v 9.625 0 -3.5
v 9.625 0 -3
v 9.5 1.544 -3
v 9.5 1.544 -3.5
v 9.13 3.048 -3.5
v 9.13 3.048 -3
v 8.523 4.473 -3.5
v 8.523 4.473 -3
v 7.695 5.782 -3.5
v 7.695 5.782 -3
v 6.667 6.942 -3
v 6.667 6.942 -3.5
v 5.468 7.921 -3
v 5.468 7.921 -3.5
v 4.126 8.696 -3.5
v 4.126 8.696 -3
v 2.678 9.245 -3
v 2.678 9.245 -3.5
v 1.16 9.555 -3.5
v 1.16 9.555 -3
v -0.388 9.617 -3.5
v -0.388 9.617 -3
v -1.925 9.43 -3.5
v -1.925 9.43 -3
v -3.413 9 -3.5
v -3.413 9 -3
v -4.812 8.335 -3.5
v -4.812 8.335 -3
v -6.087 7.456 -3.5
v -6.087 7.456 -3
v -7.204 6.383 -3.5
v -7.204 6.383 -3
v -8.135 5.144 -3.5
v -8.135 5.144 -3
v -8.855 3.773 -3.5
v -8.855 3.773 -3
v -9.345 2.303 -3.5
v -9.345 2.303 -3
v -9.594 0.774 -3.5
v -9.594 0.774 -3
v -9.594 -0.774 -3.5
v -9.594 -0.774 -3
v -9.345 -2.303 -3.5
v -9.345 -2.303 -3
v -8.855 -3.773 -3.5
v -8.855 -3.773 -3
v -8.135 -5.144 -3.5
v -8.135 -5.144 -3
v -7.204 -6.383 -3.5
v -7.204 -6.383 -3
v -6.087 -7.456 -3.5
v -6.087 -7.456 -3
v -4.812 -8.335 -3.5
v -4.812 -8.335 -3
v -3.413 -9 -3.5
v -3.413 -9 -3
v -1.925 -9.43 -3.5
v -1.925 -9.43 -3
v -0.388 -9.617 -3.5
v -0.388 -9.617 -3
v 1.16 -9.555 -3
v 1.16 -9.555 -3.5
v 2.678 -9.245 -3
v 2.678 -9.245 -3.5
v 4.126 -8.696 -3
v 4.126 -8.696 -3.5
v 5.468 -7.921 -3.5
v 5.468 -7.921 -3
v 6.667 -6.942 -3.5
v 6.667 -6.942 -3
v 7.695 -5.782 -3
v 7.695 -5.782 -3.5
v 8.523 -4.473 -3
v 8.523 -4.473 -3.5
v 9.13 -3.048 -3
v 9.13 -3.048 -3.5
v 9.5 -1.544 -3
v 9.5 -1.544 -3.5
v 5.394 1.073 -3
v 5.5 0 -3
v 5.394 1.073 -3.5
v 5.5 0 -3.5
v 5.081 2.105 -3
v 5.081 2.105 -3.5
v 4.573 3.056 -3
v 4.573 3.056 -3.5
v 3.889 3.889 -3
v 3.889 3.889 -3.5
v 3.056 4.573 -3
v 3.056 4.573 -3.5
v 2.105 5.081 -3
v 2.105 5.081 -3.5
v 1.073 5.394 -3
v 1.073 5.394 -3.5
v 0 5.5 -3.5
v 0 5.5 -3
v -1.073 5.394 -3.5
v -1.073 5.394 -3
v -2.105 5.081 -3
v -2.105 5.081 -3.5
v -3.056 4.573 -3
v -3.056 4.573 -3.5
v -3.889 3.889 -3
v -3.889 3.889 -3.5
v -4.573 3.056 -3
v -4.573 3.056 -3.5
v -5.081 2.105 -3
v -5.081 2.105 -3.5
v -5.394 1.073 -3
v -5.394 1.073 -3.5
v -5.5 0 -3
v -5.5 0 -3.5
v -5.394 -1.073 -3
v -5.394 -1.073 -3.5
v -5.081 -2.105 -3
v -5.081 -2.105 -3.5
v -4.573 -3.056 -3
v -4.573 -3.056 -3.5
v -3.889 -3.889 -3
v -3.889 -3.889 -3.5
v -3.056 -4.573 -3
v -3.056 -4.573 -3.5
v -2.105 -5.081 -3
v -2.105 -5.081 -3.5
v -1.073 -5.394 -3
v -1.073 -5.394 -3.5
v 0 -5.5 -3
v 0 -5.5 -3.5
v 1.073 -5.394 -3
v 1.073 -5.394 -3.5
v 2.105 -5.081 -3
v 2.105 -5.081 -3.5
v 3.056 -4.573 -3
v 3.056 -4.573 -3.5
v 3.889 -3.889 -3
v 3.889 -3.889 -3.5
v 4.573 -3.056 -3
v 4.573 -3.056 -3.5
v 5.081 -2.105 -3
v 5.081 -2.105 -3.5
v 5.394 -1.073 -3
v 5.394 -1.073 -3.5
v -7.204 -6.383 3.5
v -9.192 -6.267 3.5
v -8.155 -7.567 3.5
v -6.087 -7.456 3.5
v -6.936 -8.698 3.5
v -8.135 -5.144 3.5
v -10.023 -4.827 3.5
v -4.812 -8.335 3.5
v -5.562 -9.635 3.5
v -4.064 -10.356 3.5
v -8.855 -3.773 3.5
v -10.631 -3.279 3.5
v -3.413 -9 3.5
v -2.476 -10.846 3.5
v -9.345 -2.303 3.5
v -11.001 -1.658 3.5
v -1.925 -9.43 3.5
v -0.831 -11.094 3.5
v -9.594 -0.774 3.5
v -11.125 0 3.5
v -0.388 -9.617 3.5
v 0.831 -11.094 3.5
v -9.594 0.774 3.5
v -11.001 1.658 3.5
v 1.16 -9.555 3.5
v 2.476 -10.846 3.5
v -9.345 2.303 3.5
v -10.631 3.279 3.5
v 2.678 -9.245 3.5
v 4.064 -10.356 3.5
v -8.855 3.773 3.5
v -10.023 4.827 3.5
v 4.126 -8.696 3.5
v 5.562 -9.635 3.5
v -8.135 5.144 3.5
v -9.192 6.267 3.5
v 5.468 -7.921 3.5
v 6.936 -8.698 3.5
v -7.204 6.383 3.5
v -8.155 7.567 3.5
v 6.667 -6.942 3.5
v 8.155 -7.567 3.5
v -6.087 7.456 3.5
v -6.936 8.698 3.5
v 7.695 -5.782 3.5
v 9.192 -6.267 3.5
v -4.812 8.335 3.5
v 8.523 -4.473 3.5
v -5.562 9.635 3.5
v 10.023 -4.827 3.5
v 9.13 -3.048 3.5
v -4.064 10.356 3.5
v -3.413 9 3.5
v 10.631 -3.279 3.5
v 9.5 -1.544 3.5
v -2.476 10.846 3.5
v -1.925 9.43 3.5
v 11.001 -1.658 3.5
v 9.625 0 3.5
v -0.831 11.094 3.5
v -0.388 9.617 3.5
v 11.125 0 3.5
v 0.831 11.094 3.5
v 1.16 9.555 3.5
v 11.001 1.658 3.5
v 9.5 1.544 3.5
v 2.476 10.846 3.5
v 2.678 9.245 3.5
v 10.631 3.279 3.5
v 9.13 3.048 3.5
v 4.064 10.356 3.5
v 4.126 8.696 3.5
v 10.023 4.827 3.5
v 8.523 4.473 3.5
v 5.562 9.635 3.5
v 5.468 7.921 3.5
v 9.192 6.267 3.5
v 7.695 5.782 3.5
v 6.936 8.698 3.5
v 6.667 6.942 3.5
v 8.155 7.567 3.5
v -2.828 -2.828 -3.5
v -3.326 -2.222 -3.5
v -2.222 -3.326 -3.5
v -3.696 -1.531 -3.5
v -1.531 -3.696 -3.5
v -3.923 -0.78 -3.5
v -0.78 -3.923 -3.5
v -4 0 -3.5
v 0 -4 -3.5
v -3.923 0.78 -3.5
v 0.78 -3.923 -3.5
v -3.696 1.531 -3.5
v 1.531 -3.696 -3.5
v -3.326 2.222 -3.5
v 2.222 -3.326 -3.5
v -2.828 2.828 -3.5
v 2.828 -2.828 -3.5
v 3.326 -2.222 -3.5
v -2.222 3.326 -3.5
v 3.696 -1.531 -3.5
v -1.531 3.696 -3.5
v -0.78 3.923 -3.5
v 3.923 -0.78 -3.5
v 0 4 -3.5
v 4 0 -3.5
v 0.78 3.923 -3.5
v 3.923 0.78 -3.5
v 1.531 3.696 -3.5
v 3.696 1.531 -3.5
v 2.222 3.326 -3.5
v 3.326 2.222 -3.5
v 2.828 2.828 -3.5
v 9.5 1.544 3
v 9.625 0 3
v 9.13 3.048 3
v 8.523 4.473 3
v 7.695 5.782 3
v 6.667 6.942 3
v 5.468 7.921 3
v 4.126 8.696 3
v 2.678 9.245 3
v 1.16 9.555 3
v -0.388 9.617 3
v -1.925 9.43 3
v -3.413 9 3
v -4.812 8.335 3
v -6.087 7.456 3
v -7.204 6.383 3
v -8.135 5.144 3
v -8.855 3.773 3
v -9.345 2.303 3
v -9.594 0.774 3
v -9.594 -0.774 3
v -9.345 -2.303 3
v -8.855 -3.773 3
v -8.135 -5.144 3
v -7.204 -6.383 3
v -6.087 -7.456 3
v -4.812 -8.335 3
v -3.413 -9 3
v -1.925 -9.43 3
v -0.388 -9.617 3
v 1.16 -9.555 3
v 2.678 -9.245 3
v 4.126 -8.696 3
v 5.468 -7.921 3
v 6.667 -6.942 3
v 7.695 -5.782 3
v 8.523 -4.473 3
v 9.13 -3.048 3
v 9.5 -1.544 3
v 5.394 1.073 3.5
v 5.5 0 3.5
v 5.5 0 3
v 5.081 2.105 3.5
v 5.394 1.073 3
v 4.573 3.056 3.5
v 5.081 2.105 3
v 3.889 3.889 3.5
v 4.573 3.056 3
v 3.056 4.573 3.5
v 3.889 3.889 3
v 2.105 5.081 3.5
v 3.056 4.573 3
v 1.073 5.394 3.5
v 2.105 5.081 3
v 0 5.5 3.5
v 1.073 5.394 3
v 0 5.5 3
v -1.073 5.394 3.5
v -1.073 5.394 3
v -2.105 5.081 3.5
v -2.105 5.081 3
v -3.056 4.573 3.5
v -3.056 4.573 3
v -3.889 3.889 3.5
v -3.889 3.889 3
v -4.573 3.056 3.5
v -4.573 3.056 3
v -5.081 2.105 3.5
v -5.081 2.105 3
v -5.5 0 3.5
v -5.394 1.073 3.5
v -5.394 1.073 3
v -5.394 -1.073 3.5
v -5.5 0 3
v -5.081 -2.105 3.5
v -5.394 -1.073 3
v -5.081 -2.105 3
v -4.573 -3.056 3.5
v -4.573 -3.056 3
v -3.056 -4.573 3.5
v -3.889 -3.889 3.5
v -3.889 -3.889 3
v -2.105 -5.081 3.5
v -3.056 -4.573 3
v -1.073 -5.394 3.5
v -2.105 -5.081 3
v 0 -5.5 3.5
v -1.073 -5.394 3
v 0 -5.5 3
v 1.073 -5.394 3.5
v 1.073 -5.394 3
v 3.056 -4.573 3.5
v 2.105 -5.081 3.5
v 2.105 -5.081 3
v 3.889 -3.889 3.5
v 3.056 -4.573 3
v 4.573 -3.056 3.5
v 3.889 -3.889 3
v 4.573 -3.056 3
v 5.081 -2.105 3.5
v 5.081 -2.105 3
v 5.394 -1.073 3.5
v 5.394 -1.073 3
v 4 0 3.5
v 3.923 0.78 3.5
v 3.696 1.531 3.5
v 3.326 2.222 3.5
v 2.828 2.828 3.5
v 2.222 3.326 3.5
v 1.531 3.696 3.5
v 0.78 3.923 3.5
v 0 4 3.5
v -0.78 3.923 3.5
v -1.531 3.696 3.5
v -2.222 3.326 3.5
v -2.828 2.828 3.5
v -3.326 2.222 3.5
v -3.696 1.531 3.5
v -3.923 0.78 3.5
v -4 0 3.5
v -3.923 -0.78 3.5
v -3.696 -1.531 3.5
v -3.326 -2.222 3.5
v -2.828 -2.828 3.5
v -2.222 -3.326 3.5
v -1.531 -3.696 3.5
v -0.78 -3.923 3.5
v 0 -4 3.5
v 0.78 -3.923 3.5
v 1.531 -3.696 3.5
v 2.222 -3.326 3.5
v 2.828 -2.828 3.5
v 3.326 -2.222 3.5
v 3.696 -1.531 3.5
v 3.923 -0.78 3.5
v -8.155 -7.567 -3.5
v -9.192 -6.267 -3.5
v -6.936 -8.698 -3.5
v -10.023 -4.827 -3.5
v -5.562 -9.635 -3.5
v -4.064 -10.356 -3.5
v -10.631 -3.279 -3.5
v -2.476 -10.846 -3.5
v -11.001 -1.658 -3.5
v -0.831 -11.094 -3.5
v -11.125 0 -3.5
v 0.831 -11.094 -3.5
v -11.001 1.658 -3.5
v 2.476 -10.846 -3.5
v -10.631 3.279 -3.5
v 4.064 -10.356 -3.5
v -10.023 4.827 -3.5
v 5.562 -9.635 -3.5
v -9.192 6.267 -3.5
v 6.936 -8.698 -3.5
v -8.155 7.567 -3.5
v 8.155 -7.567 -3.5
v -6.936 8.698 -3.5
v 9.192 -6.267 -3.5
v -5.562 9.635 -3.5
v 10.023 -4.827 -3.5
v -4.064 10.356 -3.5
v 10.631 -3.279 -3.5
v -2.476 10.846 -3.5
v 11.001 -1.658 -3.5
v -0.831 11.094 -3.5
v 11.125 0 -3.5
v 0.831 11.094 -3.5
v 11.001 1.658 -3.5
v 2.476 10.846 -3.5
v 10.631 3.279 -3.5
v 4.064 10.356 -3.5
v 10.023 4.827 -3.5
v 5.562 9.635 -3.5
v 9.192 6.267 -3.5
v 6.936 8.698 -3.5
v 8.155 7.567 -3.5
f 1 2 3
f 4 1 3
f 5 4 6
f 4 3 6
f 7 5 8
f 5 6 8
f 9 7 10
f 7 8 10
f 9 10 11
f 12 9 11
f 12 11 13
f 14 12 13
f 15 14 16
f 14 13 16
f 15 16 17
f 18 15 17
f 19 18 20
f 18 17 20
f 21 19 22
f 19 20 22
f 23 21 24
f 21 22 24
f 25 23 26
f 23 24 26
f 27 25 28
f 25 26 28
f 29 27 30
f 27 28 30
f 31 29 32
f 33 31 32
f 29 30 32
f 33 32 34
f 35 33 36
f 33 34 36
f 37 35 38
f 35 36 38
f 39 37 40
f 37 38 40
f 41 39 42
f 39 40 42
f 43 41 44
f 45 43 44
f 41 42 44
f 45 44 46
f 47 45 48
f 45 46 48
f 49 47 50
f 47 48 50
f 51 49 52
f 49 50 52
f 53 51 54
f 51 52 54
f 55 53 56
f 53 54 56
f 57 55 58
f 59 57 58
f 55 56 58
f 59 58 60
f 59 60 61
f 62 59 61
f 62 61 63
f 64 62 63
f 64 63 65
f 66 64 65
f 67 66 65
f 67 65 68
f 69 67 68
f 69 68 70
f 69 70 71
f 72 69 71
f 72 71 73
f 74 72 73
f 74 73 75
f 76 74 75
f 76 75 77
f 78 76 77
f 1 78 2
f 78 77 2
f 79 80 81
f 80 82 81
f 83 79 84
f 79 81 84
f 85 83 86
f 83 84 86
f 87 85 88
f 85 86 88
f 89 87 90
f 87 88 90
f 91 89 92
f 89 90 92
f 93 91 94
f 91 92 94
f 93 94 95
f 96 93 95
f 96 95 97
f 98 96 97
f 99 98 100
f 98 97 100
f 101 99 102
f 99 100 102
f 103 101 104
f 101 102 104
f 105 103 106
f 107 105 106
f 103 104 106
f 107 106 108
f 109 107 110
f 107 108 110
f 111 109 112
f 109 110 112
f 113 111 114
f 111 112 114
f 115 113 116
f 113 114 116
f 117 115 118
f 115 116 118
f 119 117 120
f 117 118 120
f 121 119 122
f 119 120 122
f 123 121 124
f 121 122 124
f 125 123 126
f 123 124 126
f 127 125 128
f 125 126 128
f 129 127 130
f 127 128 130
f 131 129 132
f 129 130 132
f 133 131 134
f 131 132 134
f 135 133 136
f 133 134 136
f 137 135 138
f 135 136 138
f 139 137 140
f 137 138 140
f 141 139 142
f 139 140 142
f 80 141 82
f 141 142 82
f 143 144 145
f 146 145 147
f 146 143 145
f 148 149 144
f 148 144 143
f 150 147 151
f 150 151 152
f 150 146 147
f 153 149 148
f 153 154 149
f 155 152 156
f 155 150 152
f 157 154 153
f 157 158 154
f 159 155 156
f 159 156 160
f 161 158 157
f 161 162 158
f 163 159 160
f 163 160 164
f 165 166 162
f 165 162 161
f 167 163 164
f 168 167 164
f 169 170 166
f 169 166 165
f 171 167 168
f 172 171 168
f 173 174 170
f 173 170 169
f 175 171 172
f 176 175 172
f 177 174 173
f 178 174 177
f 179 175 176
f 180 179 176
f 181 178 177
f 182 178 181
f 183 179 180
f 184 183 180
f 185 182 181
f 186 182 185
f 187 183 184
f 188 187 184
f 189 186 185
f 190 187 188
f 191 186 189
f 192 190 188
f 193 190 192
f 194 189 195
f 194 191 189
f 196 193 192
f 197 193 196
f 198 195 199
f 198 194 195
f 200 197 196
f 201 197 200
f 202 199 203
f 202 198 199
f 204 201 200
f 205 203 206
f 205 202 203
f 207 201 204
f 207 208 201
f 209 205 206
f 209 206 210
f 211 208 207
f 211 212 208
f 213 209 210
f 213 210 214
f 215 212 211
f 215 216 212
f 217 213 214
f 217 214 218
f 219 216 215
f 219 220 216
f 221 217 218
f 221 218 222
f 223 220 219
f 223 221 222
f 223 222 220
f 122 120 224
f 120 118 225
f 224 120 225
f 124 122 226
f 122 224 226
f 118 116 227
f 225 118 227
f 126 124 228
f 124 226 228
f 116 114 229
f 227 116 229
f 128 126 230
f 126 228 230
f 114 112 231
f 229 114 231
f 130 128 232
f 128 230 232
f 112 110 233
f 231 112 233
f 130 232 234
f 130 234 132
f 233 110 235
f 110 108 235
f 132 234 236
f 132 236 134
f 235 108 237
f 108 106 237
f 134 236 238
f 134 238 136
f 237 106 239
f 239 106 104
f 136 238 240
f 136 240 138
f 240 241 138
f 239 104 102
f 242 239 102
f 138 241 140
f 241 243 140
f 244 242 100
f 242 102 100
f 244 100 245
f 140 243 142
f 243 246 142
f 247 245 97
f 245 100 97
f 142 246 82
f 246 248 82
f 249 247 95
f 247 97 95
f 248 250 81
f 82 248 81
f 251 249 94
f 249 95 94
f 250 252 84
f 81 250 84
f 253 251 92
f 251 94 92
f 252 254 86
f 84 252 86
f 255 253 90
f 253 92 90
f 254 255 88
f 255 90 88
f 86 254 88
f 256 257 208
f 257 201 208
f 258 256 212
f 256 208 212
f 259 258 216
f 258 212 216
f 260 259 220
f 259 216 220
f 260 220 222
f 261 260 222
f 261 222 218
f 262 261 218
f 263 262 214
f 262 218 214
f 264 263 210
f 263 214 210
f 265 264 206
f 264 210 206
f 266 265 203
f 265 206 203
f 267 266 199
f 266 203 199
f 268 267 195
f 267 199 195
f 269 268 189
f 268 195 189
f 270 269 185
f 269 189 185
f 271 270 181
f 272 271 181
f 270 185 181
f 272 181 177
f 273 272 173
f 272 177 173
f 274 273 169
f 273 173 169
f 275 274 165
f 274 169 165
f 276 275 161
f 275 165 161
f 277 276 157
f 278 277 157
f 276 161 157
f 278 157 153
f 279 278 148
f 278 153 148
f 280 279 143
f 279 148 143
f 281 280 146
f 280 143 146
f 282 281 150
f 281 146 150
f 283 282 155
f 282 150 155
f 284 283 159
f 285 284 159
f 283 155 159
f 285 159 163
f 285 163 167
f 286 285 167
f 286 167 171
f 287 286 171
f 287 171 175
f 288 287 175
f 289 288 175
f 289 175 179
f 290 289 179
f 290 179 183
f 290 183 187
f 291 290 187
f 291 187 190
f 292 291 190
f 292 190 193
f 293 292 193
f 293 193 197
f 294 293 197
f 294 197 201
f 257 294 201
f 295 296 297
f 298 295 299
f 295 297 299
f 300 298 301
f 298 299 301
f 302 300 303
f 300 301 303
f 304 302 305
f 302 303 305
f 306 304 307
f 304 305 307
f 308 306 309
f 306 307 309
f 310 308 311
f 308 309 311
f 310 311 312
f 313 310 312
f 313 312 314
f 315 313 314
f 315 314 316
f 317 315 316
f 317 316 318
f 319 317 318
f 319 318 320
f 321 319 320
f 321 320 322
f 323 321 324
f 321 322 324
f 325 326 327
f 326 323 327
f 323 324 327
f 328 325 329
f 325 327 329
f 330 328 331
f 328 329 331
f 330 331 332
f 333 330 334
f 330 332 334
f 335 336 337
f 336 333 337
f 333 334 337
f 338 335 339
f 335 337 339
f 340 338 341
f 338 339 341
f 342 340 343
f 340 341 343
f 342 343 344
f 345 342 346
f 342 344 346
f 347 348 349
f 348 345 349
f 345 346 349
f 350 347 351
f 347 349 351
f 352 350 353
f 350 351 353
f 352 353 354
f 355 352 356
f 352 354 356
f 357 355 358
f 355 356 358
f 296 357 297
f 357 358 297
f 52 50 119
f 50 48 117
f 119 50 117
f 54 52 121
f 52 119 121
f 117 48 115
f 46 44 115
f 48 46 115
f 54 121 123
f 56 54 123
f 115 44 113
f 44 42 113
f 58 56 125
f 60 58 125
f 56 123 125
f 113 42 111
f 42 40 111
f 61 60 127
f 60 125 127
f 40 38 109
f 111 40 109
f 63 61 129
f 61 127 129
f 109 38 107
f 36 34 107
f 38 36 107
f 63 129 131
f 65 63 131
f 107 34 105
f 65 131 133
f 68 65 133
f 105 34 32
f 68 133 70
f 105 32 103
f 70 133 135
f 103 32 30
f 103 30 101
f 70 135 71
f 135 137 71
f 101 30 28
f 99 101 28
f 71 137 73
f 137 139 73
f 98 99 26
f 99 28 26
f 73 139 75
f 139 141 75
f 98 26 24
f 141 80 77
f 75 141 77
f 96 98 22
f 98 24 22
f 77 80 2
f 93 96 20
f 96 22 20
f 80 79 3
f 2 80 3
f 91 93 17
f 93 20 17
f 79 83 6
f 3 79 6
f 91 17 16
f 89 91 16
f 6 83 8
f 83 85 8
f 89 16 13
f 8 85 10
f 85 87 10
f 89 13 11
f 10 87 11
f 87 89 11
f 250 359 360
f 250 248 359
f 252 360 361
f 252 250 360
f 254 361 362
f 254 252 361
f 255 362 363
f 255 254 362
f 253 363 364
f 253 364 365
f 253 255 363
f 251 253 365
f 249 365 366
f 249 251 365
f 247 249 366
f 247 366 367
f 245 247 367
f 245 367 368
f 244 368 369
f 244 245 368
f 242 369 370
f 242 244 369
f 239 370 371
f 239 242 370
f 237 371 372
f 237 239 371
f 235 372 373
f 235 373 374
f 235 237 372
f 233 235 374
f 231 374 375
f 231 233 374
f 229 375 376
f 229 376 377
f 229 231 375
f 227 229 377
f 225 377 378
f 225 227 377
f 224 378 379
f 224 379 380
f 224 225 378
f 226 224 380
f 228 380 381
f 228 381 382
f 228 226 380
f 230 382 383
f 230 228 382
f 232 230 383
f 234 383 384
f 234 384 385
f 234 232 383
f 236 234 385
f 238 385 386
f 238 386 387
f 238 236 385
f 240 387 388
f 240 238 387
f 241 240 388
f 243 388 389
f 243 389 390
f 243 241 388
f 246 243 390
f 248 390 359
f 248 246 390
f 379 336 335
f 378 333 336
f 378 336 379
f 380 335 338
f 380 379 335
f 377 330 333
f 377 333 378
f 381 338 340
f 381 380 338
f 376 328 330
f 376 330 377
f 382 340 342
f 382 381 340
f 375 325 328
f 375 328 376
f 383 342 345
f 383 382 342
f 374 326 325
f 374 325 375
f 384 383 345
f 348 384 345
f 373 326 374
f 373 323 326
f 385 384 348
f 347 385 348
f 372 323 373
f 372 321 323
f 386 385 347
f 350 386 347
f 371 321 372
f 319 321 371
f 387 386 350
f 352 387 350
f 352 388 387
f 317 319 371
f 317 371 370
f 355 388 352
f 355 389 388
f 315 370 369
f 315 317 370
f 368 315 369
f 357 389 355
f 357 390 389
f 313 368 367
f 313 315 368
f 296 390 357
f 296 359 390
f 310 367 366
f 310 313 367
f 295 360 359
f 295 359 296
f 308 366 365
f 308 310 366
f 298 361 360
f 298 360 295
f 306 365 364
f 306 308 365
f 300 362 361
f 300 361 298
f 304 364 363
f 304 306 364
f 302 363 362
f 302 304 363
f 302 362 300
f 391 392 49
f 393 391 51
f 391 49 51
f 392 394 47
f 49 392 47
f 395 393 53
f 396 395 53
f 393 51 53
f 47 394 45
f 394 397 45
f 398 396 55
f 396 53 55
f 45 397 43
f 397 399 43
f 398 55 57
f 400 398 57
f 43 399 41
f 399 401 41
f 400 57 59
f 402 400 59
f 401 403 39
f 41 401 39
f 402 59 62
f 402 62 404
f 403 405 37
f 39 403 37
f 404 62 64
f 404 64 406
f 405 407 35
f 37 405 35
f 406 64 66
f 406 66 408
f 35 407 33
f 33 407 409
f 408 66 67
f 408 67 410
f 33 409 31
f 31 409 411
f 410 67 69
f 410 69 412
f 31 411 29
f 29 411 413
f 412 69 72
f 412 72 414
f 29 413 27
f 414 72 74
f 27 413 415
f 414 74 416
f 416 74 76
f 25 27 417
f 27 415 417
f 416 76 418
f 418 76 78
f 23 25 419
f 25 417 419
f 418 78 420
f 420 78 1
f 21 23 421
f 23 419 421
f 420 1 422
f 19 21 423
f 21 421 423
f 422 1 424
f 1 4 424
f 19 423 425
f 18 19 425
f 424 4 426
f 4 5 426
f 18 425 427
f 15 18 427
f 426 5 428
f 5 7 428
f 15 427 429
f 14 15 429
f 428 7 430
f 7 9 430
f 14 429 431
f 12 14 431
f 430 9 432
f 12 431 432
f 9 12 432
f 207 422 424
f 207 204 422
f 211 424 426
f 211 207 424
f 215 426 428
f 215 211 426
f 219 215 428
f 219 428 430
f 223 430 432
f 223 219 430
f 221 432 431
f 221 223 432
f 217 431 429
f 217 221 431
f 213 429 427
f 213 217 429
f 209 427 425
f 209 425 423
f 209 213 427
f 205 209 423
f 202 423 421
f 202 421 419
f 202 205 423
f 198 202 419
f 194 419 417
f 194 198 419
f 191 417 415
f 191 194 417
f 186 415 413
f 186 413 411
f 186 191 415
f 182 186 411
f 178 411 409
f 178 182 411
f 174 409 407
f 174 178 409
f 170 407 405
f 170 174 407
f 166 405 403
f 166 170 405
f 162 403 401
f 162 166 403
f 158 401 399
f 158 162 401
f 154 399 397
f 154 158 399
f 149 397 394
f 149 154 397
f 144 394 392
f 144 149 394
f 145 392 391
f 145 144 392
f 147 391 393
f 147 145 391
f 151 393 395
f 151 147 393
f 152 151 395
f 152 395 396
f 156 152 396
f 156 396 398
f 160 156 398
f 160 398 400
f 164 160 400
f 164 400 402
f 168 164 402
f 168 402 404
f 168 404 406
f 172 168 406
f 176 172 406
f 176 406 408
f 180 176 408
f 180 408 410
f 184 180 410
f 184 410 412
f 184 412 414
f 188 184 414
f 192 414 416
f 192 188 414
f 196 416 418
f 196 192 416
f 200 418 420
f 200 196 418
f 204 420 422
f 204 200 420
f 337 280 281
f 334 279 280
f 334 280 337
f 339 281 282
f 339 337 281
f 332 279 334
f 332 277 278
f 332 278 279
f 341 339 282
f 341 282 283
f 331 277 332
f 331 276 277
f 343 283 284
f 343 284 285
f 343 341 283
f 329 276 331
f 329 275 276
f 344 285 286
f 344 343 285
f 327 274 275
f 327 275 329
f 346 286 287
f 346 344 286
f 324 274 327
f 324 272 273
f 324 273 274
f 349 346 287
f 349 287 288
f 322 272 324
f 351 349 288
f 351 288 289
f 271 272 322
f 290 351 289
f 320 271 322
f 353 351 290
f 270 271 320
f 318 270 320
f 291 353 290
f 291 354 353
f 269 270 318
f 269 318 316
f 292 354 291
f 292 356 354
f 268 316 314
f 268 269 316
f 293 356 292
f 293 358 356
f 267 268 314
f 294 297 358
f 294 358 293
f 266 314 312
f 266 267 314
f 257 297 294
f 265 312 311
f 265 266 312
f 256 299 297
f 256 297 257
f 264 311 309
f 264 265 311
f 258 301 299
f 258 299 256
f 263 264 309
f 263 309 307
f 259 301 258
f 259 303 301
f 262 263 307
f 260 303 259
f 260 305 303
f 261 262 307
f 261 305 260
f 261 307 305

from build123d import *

# Parameters (mm, degrees)
F0_R     = 11.125
F0_R_2   = 4
F1_DEPTH = 3.5
F2_R     = 9.625
F2_R_2   = 5.5
F3_DEPTH = 12.5
F4_DEPTH = 3


with BuildPart() as f1:
    # F0 (on Top) → F1 (new body, symmetric)
    with BuildSketch(Plane.XY):
        Circle(F0_R)
        Circle(F0_R_2, mode=Mode.SUBTRACT)
    extrude(amount=F1_DEPTH, both=True)

    # F2 (on Top) → F3 (cut, symmetric)
    with BuildSketch(Plane.XY):
        Circle(F2_R)
        Circle(F2_R_2, mode=Mode.SUBTRACT)
    extrude(amount=F3_DEPTH, both=True, mode=Mode.SUBTRACT)

    # F2 (on Top) → F4 (join, symmetric)
    with BuildSketch(Plane.XY):
        Circle(F2_R)
        Circle(F2_R_2, mode=Mode.SUBTRACT)
    extrude(amount=F4_DEPTH, both=True)


solid = f1.part
